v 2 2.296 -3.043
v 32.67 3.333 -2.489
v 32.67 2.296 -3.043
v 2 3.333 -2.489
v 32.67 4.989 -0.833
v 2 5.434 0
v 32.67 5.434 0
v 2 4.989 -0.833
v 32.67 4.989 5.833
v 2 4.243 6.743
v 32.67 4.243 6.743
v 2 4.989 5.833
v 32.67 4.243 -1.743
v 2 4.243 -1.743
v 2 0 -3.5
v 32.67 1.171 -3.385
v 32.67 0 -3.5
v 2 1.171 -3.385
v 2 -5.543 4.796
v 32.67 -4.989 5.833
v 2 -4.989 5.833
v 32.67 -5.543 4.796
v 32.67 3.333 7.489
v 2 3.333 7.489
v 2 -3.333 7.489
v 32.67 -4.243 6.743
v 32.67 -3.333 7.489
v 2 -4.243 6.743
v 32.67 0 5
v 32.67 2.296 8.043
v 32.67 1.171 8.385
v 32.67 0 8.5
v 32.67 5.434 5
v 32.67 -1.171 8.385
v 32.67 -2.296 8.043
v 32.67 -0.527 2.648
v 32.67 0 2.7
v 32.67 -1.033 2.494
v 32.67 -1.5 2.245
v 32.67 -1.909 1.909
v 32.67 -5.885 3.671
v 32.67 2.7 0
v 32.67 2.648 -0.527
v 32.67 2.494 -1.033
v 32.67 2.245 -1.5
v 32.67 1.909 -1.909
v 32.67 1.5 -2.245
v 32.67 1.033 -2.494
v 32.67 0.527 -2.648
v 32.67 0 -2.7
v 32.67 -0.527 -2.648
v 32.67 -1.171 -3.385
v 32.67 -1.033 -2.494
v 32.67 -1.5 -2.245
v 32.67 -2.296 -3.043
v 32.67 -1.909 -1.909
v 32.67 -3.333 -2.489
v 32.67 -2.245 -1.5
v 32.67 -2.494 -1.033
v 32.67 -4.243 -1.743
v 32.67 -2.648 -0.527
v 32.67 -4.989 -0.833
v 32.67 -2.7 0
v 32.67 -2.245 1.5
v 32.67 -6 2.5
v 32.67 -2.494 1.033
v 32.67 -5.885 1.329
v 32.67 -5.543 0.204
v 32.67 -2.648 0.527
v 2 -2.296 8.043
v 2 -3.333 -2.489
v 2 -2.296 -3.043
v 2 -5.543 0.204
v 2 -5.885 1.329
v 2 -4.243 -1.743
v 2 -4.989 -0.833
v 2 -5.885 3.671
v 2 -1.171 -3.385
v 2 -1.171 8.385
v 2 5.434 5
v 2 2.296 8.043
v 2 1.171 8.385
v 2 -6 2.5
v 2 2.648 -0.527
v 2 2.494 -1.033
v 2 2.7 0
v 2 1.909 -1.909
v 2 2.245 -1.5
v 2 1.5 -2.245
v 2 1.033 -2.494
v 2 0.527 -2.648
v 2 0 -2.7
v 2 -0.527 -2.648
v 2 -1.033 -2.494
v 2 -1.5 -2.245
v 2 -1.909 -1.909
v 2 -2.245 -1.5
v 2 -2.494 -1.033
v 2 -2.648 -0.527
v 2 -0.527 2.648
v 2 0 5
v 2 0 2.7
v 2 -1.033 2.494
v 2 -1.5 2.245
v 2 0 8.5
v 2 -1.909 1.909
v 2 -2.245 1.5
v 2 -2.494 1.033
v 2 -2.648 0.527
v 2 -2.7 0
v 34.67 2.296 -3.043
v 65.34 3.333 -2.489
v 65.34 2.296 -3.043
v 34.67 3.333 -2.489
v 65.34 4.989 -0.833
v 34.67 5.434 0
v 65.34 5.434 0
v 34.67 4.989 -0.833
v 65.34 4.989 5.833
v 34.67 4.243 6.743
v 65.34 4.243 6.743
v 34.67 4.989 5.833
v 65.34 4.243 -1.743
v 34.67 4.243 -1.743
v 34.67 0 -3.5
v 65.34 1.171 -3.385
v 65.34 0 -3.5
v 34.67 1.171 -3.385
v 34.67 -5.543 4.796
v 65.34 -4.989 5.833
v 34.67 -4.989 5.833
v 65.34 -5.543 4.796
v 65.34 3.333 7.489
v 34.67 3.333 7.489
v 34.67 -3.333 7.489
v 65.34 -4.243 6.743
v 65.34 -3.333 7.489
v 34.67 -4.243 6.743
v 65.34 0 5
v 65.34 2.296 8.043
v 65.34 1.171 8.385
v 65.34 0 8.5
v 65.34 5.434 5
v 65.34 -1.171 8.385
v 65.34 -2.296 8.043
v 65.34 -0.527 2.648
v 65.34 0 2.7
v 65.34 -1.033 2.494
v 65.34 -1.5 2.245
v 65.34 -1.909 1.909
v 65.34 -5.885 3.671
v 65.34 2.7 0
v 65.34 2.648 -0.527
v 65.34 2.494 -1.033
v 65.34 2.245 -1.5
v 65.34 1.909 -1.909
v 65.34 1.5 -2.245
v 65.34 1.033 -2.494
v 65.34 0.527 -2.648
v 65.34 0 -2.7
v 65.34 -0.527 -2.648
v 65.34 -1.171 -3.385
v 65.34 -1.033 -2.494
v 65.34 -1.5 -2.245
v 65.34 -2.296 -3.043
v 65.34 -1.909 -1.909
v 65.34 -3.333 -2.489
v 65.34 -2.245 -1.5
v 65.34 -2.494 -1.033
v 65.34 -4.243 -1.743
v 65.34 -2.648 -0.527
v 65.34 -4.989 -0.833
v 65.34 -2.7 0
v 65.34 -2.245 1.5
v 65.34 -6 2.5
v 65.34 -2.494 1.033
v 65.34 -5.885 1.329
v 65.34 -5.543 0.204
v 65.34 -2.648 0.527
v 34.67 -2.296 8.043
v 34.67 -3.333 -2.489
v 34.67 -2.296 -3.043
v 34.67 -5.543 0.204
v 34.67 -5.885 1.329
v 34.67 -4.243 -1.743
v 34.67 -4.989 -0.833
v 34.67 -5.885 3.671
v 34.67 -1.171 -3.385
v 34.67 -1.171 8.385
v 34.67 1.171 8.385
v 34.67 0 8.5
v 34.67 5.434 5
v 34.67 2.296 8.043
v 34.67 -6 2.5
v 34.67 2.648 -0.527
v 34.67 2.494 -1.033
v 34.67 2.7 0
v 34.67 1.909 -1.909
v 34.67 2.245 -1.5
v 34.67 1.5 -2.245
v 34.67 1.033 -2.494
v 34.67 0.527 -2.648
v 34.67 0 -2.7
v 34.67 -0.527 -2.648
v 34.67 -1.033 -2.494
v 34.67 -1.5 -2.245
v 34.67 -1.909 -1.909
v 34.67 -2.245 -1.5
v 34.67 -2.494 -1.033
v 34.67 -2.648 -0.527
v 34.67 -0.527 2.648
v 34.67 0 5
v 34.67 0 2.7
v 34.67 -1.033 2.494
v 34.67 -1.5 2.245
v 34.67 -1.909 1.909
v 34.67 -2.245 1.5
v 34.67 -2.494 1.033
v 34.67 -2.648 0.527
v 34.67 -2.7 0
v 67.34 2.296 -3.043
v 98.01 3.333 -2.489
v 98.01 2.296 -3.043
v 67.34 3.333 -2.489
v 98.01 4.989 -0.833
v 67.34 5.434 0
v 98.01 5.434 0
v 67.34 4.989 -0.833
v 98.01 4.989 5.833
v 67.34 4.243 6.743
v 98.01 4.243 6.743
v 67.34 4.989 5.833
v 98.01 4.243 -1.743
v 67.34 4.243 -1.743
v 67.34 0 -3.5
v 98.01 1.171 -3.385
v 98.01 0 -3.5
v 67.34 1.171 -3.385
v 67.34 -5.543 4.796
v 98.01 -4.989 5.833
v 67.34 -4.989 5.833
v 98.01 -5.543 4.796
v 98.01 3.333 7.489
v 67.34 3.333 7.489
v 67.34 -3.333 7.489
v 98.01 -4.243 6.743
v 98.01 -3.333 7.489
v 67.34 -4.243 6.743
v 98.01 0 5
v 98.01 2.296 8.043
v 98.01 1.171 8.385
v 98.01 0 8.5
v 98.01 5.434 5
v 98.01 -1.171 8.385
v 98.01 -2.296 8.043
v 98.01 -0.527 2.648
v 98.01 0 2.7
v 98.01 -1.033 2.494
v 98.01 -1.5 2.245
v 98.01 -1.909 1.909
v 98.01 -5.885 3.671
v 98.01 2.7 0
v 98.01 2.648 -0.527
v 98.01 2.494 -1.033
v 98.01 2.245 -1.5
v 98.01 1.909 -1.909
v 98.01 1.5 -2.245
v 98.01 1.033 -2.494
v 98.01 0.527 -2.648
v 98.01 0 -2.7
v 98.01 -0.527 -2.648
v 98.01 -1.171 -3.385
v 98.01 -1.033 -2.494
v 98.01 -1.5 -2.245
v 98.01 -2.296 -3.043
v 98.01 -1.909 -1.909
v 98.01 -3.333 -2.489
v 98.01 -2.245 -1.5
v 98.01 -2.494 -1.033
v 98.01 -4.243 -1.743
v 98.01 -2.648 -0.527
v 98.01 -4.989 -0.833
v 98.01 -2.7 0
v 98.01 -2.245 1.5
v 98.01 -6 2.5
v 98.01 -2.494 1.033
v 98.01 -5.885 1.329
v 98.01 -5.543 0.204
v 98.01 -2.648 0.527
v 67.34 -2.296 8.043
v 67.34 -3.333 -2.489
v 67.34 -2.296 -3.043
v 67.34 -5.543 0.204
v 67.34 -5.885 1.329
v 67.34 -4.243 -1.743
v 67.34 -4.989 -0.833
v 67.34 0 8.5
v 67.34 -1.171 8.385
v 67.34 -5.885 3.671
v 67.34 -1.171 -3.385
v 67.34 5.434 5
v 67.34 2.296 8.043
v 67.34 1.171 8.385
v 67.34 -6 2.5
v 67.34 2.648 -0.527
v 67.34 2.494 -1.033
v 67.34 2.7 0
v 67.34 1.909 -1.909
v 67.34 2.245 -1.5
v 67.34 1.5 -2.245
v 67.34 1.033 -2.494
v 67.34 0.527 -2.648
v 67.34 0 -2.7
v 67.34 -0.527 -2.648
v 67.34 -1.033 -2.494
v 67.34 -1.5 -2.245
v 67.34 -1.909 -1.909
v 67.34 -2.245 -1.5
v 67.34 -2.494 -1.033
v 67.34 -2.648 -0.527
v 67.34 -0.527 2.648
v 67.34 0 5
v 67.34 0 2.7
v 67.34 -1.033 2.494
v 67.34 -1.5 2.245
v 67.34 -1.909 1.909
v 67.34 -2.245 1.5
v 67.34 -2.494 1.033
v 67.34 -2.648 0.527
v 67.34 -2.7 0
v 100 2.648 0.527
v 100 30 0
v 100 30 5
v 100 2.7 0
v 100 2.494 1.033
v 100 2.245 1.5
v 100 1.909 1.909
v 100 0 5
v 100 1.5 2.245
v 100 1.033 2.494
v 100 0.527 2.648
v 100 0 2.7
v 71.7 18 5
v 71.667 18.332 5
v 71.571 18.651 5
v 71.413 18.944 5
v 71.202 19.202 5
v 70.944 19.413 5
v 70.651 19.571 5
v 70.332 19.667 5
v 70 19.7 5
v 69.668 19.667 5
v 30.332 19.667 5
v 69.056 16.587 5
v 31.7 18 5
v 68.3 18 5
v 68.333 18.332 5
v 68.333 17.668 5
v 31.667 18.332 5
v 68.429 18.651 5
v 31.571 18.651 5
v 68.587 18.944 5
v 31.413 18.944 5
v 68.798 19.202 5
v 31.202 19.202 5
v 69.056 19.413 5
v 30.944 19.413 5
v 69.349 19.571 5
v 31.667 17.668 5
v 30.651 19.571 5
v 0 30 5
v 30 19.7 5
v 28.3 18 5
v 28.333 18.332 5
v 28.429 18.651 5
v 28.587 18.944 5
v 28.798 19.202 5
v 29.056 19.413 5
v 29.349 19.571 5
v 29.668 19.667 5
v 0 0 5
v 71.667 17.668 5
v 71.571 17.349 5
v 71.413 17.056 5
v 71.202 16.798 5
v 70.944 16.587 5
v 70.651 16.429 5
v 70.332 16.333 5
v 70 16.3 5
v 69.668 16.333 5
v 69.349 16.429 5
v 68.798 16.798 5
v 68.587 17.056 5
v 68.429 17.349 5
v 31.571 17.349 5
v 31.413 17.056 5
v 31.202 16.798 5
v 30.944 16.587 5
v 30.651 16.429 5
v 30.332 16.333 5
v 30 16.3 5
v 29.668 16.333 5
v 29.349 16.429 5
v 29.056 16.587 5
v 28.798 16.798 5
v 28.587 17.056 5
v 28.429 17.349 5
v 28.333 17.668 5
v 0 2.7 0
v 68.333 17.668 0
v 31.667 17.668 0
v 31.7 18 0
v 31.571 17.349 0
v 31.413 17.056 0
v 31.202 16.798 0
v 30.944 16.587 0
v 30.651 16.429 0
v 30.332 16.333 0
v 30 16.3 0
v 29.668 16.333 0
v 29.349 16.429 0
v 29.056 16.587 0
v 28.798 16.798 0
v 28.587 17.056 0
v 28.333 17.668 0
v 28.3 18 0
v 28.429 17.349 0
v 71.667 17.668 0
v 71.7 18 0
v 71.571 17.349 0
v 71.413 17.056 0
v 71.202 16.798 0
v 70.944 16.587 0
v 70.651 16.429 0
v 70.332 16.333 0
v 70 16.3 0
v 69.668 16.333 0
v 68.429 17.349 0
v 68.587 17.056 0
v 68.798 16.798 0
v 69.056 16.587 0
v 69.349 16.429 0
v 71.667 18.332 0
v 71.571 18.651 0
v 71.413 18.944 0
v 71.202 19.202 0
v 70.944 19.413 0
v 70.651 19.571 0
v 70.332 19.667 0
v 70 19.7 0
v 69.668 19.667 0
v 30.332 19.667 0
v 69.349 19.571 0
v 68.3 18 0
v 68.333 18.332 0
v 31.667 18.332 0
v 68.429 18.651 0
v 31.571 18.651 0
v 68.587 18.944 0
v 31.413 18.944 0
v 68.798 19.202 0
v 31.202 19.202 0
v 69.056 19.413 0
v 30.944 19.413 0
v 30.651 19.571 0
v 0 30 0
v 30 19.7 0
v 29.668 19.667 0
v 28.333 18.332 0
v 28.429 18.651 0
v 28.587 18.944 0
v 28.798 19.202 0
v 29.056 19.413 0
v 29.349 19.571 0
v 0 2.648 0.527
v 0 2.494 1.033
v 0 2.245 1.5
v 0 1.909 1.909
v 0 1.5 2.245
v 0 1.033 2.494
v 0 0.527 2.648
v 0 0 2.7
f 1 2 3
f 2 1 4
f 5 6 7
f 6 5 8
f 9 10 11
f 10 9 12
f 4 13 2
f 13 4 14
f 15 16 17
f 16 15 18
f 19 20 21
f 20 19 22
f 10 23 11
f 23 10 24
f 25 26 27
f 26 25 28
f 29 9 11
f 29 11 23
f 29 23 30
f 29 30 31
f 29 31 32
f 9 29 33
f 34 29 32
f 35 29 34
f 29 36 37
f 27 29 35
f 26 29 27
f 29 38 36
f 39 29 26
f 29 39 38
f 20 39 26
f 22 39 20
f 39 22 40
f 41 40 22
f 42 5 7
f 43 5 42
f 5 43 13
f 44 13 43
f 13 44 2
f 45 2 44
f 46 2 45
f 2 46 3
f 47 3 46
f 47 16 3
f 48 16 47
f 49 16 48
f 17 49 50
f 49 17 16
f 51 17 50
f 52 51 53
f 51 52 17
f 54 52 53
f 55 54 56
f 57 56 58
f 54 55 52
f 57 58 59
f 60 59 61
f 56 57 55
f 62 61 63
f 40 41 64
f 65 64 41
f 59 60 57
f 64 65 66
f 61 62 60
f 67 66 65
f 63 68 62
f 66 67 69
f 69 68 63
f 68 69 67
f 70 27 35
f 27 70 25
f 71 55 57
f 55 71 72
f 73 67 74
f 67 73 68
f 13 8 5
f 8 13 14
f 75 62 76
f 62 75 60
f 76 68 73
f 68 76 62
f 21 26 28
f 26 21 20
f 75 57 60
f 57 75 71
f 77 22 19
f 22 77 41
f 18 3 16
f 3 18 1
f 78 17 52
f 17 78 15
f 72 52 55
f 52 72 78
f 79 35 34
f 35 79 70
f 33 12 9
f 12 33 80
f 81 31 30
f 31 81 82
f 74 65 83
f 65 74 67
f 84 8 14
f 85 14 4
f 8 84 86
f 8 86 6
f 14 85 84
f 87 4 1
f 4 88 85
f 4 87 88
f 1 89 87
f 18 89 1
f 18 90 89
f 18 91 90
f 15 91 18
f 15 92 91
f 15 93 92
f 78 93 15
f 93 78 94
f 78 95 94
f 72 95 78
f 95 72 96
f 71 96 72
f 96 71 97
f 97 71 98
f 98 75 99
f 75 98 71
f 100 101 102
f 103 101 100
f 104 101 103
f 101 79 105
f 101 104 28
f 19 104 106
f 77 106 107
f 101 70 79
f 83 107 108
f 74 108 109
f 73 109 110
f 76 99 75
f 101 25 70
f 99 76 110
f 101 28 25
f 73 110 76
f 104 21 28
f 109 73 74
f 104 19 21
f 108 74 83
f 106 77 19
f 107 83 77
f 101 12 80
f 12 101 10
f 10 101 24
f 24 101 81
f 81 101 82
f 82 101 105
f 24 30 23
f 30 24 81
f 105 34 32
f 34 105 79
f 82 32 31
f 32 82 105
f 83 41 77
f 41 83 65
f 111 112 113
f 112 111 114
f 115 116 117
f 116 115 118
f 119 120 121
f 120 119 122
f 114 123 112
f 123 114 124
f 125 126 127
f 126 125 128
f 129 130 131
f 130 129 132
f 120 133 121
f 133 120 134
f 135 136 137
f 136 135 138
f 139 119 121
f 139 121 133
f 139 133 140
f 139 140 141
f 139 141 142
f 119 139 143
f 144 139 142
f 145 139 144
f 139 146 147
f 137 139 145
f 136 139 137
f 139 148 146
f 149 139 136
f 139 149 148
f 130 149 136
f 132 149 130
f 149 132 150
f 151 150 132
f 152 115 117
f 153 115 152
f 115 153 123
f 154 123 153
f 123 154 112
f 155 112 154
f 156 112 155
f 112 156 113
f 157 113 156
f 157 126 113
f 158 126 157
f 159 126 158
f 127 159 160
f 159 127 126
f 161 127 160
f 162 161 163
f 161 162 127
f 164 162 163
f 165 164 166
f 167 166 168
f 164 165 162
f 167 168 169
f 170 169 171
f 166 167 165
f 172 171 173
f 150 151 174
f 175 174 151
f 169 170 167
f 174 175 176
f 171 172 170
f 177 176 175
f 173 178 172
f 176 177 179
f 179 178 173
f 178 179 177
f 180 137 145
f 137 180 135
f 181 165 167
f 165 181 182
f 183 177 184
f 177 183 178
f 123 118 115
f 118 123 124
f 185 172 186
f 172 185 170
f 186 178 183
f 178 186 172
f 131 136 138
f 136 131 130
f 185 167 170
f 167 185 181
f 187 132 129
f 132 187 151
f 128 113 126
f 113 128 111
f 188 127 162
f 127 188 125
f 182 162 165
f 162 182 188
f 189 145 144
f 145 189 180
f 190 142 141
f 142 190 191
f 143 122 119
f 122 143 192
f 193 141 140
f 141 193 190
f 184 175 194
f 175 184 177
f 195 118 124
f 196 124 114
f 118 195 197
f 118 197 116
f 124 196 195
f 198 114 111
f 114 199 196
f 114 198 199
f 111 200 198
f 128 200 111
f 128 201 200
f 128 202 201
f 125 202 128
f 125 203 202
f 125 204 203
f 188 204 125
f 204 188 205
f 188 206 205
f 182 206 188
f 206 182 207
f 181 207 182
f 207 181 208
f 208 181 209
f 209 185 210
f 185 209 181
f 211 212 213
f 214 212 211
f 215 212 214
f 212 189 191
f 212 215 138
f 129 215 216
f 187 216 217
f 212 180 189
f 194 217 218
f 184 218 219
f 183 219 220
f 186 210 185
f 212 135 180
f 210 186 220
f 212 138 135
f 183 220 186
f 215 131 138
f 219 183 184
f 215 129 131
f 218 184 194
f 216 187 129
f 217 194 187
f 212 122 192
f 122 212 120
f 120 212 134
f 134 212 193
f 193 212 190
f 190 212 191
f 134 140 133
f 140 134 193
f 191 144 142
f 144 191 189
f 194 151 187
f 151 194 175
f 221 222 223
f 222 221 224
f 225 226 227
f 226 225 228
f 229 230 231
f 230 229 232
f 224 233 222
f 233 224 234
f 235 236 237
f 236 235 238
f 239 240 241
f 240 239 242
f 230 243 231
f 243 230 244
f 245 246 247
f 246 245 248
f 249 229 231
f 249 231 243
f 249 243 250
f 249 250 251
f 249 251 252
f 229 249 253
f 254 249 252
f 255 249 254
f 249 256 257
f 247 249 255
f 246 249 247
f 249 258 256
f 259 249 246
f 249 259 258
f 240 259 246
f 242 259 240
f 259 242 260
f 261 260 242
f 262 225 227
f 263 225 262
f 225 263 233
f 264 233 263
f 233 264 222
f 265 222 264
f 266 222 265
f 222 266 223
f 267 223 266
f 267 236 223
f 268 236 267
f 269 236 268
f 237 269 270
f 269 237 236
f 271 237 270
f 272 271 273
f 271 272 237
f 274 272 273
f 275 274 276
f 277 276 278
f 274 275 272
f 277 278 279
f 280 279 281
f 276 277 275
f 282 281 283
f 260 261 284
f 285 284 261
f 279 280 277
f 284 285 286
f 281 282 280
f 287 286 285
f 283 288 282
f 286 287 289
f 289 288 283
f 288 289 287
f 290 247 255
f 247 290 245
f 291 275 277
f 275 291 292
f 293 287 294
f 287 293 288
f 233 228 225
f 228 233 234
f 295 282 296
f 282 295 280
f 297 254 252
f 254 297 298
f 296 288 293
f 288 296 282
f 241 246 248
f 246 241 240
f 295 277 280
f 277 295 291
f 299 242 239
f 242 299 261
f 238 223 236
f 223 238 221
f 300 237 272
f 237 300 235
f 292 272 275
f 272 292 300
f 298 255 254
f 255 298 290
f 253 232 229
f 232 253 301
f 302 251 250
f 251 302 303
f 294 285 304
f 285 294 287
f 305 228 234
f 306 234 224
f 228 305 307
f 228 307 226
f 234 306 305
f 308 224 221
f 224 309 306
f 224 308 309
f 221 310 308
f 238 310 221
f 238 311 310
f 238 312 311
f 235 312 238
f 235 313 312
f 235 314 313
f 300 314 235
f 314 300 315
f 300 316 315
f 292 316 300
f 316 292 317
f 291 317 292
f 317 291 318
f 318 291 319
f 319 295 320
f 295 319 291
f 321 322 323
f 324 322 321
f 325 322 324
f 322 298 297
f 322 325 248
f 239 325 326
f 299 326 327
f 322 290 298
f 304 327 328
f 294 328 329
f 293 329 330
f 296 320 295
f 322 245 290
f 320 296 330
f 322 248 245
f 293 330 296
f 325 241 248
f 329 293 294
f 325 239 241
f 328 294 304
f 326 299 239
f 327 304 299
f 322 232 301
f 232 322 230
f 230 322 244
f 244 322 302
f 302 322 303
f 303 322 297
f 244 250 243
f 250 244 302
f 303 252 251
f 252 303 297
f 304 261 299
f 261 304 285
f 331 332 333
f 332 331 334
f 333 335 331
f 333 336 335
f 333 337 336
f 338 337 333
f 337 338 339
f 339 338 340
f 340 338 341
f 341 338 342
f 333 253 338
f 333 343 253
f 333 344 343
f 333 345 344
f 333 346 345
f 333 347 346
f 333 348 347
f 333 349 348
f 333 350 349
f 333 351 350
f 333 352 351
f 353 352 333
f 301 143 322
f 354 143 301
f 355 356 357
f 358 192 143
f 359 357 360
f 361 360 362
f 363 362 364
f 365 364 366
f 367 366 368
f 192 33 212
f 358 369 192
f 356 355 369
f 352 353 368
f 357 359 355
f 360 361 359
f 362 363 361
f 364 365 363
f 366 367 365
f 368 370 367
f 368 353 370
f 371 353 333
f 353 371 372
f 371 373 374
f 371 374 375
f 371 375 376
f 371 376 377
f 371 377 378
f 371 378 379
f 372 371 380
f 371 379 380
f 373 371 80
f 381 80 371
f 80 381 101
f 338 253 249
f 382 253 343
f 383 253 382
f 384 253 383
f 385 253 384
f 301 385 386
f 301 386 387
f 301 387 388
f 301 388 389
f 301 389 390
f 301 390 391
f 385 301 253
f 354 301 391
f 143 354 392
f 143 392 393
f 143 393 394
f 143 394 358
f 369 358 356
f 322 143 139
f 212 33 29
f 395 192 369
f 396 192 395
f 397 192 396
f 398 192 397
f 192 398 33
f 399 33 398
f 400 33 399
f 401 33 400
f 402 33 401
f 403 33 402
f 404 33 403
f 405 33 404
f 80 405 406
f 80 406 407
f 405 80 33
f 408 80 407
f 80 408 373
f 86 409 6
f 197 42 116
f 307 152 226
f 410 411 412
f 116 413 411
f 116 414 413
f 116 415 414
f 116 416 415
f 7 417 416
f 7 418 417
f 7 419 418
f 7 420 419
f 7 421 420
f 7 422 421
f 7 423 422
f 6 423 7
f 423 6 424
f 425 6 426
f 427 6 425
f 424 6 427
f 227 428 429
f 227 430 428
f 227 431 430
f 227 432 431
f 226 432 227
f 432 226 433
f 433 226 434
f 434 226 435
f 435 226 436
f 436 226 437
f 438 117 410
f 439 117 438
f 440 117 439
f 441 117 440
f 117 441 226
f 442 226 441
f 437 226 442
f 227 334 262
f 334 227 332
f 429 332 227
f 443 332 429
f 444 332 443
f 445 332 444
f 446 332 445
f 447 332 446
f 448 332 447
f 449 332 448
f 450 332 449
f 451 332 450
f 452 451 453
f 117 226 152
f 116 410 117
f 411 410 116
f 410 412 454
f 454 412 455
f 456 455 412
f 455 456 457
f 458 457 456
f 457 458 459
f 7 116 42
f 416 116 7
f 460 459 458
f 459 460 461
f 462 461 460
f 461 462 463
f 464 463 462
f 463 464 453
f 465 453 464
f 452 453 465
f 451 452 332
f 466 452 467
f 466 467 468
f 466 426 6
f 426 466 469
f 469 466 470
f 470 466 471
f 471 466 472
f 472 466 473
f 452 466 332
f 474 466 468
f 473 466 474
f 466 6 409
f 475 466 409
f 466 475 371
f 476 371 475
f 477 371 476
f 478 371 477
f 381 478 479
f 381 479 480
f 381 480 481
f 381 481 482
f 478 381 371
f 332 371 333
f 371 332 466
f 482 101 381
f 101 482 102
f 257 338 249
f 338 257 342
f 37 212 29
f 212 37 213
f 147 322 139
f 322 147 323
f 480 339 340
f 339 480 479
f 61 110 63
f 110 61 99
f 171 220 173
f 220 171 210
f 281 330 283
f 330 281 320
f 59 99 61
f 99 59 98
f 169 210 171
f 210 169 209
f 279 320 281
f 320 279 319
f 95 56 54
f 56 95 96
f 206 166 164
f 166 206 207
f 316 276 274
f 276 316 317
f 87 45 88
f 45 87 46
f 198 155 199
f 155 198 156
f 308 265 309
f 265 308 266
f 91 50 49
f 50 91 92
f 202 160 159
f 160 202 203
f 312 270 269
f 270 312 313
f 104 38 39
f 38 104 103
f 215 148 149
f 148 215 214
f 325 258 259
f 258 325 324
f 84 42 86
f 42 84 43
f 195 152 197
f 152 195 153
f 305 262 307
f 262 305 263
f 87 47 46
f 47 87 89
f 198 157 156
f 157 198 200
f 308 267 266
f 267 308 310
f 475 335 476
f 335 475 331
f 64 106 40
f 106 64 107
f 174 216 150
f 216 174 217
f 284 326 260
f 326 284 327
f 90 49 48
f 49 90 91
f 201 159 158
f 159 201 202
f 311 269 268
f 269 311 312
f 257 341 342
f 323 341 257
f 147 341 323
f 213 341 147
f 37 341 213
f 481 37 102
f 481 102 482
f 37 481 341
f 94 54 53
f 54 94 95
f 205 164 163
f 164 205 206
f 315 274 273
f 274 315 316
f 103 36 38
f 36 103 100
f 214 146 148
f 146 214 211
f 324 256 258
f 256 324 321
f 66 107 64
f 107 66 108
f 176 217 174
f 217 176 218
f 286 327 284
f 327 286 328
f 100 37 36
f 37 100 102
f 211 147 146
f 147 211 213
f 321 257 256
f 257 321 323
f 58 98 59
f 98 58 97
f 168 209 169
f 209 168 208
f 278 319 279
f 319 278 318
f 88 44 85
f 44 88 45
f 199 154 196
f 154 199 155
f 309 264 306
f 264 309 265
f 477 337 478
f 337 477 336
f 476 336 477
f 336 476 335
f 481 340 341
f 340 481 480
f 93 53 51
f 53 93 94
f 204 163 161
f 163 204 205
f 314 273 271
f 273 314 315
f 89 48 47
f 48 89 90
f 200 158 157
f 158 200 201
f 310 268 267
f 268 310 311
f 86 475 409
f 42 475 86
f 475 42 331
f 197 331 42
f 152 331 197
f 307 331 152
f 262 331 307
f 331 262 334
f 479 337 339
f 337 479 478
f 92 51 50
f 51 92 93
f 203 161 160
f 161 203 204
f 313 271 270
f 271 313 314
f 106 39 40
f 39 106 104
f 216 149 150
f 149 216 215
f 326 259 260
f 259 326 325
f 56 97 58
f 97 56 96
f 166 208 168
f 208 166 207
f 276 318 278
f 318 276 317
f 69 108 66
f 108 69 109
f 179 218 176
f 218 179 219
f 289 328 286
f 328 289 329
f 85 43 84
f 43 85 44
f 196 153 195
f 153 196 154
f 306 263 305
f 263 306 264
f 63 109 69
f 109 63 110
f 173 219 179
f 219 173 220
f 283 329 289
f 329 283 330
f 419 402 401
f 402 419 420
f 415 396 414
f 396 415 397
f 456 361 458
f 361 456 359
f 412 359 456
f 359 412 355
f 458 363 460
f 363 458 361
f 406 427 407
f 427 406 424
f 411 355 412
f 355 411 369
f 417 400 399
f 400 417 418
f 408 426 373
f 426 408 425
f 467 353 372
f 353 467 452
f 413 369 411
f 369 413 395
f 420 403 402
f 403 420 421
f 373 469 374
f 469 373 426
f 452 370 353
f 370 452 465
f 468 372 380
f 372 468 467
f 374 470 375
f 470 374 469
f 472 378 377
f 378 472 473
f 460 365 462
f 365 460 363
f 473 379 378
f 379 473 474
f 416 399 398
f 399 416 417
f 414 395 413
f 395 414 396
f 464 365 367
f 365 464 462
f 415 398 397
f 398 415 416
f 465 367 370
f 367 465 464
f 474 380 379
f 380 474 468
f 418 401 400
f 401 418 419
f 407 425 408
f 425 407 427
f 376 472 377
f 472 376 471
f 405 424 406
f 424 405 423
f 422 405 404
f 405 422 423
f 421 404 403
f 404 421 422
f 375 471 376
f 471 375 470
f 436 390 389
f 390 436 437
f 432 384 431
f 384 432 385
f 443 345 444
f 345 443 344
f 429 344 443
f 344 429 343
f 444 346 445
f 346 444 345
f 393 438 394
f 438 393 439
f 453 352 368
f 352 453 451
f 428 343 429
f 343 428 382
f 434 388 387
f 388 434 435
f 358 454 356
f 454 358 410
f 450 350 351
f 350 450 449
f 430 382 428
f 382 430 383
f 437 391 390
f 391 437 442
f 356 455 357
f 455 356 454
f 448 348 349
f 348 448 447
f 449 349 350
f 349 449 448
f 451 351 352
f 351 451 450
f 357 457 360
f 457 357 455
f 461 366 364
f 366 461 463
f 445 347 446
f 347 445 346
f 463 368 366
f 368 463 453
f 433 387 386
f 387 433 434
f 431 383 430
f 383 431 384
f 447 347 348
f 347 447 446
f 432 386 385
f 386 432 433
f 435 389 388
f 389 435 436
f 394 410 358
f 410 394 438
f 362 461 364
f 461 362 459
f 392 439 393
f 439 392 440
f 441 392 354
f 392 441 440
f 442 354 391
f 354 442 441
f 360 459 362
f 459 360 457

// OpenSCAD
$fn = 32;

// ----------------------------------------------------------------------
// Hinge leaf: 100 x 36 x 12 mm
// ----------------------------------------------------------------------

// --- parameters (mm) ---
plate_len = 100;          // leaf length, X
plate_w = 30;             // leaf width, Y
plate_t = 5;              // leaf thickness
barrel_d = 12;            // knuckle diameter
barrel_w = 30.67;         // knuckle width
knuckle_n = 3;            // number of knuckles
pin_d = 5.4;              // pin bore
gap = 2;                  // gap between the knuckles
screw_d = 3.4;            // screw clearance

module leaf() {
  cube([plate_len, plate_w, plate_t]);
}

module knuckles() {
  /* barrels sit on the leaf edge, the pin axis at half the leaf thickness */
  for (i = [0 : knuckle_n - 1])
    translate([gap + i * (barrel_w + gap), 0, plate_t * 0.5])
      rotate([0, 90, 0]) cylinder(h = barrel_w, d = barrel_d);
}

difference() {
  union() {
    leaf();
    knuckles();
  }
  rotate([0, 90, 0]) translate([0, 0, -1])
    cylinder(h = plate_len + 2, d = pin_d);
  translate([30, plate_w * 0.6, -1]) cylinder(h = plate_t + 2, d = screw_d);
  translate([70, plate_w * 0.6, -1]) cylinder(h = plate_t + 2, d = screw_d);
}
